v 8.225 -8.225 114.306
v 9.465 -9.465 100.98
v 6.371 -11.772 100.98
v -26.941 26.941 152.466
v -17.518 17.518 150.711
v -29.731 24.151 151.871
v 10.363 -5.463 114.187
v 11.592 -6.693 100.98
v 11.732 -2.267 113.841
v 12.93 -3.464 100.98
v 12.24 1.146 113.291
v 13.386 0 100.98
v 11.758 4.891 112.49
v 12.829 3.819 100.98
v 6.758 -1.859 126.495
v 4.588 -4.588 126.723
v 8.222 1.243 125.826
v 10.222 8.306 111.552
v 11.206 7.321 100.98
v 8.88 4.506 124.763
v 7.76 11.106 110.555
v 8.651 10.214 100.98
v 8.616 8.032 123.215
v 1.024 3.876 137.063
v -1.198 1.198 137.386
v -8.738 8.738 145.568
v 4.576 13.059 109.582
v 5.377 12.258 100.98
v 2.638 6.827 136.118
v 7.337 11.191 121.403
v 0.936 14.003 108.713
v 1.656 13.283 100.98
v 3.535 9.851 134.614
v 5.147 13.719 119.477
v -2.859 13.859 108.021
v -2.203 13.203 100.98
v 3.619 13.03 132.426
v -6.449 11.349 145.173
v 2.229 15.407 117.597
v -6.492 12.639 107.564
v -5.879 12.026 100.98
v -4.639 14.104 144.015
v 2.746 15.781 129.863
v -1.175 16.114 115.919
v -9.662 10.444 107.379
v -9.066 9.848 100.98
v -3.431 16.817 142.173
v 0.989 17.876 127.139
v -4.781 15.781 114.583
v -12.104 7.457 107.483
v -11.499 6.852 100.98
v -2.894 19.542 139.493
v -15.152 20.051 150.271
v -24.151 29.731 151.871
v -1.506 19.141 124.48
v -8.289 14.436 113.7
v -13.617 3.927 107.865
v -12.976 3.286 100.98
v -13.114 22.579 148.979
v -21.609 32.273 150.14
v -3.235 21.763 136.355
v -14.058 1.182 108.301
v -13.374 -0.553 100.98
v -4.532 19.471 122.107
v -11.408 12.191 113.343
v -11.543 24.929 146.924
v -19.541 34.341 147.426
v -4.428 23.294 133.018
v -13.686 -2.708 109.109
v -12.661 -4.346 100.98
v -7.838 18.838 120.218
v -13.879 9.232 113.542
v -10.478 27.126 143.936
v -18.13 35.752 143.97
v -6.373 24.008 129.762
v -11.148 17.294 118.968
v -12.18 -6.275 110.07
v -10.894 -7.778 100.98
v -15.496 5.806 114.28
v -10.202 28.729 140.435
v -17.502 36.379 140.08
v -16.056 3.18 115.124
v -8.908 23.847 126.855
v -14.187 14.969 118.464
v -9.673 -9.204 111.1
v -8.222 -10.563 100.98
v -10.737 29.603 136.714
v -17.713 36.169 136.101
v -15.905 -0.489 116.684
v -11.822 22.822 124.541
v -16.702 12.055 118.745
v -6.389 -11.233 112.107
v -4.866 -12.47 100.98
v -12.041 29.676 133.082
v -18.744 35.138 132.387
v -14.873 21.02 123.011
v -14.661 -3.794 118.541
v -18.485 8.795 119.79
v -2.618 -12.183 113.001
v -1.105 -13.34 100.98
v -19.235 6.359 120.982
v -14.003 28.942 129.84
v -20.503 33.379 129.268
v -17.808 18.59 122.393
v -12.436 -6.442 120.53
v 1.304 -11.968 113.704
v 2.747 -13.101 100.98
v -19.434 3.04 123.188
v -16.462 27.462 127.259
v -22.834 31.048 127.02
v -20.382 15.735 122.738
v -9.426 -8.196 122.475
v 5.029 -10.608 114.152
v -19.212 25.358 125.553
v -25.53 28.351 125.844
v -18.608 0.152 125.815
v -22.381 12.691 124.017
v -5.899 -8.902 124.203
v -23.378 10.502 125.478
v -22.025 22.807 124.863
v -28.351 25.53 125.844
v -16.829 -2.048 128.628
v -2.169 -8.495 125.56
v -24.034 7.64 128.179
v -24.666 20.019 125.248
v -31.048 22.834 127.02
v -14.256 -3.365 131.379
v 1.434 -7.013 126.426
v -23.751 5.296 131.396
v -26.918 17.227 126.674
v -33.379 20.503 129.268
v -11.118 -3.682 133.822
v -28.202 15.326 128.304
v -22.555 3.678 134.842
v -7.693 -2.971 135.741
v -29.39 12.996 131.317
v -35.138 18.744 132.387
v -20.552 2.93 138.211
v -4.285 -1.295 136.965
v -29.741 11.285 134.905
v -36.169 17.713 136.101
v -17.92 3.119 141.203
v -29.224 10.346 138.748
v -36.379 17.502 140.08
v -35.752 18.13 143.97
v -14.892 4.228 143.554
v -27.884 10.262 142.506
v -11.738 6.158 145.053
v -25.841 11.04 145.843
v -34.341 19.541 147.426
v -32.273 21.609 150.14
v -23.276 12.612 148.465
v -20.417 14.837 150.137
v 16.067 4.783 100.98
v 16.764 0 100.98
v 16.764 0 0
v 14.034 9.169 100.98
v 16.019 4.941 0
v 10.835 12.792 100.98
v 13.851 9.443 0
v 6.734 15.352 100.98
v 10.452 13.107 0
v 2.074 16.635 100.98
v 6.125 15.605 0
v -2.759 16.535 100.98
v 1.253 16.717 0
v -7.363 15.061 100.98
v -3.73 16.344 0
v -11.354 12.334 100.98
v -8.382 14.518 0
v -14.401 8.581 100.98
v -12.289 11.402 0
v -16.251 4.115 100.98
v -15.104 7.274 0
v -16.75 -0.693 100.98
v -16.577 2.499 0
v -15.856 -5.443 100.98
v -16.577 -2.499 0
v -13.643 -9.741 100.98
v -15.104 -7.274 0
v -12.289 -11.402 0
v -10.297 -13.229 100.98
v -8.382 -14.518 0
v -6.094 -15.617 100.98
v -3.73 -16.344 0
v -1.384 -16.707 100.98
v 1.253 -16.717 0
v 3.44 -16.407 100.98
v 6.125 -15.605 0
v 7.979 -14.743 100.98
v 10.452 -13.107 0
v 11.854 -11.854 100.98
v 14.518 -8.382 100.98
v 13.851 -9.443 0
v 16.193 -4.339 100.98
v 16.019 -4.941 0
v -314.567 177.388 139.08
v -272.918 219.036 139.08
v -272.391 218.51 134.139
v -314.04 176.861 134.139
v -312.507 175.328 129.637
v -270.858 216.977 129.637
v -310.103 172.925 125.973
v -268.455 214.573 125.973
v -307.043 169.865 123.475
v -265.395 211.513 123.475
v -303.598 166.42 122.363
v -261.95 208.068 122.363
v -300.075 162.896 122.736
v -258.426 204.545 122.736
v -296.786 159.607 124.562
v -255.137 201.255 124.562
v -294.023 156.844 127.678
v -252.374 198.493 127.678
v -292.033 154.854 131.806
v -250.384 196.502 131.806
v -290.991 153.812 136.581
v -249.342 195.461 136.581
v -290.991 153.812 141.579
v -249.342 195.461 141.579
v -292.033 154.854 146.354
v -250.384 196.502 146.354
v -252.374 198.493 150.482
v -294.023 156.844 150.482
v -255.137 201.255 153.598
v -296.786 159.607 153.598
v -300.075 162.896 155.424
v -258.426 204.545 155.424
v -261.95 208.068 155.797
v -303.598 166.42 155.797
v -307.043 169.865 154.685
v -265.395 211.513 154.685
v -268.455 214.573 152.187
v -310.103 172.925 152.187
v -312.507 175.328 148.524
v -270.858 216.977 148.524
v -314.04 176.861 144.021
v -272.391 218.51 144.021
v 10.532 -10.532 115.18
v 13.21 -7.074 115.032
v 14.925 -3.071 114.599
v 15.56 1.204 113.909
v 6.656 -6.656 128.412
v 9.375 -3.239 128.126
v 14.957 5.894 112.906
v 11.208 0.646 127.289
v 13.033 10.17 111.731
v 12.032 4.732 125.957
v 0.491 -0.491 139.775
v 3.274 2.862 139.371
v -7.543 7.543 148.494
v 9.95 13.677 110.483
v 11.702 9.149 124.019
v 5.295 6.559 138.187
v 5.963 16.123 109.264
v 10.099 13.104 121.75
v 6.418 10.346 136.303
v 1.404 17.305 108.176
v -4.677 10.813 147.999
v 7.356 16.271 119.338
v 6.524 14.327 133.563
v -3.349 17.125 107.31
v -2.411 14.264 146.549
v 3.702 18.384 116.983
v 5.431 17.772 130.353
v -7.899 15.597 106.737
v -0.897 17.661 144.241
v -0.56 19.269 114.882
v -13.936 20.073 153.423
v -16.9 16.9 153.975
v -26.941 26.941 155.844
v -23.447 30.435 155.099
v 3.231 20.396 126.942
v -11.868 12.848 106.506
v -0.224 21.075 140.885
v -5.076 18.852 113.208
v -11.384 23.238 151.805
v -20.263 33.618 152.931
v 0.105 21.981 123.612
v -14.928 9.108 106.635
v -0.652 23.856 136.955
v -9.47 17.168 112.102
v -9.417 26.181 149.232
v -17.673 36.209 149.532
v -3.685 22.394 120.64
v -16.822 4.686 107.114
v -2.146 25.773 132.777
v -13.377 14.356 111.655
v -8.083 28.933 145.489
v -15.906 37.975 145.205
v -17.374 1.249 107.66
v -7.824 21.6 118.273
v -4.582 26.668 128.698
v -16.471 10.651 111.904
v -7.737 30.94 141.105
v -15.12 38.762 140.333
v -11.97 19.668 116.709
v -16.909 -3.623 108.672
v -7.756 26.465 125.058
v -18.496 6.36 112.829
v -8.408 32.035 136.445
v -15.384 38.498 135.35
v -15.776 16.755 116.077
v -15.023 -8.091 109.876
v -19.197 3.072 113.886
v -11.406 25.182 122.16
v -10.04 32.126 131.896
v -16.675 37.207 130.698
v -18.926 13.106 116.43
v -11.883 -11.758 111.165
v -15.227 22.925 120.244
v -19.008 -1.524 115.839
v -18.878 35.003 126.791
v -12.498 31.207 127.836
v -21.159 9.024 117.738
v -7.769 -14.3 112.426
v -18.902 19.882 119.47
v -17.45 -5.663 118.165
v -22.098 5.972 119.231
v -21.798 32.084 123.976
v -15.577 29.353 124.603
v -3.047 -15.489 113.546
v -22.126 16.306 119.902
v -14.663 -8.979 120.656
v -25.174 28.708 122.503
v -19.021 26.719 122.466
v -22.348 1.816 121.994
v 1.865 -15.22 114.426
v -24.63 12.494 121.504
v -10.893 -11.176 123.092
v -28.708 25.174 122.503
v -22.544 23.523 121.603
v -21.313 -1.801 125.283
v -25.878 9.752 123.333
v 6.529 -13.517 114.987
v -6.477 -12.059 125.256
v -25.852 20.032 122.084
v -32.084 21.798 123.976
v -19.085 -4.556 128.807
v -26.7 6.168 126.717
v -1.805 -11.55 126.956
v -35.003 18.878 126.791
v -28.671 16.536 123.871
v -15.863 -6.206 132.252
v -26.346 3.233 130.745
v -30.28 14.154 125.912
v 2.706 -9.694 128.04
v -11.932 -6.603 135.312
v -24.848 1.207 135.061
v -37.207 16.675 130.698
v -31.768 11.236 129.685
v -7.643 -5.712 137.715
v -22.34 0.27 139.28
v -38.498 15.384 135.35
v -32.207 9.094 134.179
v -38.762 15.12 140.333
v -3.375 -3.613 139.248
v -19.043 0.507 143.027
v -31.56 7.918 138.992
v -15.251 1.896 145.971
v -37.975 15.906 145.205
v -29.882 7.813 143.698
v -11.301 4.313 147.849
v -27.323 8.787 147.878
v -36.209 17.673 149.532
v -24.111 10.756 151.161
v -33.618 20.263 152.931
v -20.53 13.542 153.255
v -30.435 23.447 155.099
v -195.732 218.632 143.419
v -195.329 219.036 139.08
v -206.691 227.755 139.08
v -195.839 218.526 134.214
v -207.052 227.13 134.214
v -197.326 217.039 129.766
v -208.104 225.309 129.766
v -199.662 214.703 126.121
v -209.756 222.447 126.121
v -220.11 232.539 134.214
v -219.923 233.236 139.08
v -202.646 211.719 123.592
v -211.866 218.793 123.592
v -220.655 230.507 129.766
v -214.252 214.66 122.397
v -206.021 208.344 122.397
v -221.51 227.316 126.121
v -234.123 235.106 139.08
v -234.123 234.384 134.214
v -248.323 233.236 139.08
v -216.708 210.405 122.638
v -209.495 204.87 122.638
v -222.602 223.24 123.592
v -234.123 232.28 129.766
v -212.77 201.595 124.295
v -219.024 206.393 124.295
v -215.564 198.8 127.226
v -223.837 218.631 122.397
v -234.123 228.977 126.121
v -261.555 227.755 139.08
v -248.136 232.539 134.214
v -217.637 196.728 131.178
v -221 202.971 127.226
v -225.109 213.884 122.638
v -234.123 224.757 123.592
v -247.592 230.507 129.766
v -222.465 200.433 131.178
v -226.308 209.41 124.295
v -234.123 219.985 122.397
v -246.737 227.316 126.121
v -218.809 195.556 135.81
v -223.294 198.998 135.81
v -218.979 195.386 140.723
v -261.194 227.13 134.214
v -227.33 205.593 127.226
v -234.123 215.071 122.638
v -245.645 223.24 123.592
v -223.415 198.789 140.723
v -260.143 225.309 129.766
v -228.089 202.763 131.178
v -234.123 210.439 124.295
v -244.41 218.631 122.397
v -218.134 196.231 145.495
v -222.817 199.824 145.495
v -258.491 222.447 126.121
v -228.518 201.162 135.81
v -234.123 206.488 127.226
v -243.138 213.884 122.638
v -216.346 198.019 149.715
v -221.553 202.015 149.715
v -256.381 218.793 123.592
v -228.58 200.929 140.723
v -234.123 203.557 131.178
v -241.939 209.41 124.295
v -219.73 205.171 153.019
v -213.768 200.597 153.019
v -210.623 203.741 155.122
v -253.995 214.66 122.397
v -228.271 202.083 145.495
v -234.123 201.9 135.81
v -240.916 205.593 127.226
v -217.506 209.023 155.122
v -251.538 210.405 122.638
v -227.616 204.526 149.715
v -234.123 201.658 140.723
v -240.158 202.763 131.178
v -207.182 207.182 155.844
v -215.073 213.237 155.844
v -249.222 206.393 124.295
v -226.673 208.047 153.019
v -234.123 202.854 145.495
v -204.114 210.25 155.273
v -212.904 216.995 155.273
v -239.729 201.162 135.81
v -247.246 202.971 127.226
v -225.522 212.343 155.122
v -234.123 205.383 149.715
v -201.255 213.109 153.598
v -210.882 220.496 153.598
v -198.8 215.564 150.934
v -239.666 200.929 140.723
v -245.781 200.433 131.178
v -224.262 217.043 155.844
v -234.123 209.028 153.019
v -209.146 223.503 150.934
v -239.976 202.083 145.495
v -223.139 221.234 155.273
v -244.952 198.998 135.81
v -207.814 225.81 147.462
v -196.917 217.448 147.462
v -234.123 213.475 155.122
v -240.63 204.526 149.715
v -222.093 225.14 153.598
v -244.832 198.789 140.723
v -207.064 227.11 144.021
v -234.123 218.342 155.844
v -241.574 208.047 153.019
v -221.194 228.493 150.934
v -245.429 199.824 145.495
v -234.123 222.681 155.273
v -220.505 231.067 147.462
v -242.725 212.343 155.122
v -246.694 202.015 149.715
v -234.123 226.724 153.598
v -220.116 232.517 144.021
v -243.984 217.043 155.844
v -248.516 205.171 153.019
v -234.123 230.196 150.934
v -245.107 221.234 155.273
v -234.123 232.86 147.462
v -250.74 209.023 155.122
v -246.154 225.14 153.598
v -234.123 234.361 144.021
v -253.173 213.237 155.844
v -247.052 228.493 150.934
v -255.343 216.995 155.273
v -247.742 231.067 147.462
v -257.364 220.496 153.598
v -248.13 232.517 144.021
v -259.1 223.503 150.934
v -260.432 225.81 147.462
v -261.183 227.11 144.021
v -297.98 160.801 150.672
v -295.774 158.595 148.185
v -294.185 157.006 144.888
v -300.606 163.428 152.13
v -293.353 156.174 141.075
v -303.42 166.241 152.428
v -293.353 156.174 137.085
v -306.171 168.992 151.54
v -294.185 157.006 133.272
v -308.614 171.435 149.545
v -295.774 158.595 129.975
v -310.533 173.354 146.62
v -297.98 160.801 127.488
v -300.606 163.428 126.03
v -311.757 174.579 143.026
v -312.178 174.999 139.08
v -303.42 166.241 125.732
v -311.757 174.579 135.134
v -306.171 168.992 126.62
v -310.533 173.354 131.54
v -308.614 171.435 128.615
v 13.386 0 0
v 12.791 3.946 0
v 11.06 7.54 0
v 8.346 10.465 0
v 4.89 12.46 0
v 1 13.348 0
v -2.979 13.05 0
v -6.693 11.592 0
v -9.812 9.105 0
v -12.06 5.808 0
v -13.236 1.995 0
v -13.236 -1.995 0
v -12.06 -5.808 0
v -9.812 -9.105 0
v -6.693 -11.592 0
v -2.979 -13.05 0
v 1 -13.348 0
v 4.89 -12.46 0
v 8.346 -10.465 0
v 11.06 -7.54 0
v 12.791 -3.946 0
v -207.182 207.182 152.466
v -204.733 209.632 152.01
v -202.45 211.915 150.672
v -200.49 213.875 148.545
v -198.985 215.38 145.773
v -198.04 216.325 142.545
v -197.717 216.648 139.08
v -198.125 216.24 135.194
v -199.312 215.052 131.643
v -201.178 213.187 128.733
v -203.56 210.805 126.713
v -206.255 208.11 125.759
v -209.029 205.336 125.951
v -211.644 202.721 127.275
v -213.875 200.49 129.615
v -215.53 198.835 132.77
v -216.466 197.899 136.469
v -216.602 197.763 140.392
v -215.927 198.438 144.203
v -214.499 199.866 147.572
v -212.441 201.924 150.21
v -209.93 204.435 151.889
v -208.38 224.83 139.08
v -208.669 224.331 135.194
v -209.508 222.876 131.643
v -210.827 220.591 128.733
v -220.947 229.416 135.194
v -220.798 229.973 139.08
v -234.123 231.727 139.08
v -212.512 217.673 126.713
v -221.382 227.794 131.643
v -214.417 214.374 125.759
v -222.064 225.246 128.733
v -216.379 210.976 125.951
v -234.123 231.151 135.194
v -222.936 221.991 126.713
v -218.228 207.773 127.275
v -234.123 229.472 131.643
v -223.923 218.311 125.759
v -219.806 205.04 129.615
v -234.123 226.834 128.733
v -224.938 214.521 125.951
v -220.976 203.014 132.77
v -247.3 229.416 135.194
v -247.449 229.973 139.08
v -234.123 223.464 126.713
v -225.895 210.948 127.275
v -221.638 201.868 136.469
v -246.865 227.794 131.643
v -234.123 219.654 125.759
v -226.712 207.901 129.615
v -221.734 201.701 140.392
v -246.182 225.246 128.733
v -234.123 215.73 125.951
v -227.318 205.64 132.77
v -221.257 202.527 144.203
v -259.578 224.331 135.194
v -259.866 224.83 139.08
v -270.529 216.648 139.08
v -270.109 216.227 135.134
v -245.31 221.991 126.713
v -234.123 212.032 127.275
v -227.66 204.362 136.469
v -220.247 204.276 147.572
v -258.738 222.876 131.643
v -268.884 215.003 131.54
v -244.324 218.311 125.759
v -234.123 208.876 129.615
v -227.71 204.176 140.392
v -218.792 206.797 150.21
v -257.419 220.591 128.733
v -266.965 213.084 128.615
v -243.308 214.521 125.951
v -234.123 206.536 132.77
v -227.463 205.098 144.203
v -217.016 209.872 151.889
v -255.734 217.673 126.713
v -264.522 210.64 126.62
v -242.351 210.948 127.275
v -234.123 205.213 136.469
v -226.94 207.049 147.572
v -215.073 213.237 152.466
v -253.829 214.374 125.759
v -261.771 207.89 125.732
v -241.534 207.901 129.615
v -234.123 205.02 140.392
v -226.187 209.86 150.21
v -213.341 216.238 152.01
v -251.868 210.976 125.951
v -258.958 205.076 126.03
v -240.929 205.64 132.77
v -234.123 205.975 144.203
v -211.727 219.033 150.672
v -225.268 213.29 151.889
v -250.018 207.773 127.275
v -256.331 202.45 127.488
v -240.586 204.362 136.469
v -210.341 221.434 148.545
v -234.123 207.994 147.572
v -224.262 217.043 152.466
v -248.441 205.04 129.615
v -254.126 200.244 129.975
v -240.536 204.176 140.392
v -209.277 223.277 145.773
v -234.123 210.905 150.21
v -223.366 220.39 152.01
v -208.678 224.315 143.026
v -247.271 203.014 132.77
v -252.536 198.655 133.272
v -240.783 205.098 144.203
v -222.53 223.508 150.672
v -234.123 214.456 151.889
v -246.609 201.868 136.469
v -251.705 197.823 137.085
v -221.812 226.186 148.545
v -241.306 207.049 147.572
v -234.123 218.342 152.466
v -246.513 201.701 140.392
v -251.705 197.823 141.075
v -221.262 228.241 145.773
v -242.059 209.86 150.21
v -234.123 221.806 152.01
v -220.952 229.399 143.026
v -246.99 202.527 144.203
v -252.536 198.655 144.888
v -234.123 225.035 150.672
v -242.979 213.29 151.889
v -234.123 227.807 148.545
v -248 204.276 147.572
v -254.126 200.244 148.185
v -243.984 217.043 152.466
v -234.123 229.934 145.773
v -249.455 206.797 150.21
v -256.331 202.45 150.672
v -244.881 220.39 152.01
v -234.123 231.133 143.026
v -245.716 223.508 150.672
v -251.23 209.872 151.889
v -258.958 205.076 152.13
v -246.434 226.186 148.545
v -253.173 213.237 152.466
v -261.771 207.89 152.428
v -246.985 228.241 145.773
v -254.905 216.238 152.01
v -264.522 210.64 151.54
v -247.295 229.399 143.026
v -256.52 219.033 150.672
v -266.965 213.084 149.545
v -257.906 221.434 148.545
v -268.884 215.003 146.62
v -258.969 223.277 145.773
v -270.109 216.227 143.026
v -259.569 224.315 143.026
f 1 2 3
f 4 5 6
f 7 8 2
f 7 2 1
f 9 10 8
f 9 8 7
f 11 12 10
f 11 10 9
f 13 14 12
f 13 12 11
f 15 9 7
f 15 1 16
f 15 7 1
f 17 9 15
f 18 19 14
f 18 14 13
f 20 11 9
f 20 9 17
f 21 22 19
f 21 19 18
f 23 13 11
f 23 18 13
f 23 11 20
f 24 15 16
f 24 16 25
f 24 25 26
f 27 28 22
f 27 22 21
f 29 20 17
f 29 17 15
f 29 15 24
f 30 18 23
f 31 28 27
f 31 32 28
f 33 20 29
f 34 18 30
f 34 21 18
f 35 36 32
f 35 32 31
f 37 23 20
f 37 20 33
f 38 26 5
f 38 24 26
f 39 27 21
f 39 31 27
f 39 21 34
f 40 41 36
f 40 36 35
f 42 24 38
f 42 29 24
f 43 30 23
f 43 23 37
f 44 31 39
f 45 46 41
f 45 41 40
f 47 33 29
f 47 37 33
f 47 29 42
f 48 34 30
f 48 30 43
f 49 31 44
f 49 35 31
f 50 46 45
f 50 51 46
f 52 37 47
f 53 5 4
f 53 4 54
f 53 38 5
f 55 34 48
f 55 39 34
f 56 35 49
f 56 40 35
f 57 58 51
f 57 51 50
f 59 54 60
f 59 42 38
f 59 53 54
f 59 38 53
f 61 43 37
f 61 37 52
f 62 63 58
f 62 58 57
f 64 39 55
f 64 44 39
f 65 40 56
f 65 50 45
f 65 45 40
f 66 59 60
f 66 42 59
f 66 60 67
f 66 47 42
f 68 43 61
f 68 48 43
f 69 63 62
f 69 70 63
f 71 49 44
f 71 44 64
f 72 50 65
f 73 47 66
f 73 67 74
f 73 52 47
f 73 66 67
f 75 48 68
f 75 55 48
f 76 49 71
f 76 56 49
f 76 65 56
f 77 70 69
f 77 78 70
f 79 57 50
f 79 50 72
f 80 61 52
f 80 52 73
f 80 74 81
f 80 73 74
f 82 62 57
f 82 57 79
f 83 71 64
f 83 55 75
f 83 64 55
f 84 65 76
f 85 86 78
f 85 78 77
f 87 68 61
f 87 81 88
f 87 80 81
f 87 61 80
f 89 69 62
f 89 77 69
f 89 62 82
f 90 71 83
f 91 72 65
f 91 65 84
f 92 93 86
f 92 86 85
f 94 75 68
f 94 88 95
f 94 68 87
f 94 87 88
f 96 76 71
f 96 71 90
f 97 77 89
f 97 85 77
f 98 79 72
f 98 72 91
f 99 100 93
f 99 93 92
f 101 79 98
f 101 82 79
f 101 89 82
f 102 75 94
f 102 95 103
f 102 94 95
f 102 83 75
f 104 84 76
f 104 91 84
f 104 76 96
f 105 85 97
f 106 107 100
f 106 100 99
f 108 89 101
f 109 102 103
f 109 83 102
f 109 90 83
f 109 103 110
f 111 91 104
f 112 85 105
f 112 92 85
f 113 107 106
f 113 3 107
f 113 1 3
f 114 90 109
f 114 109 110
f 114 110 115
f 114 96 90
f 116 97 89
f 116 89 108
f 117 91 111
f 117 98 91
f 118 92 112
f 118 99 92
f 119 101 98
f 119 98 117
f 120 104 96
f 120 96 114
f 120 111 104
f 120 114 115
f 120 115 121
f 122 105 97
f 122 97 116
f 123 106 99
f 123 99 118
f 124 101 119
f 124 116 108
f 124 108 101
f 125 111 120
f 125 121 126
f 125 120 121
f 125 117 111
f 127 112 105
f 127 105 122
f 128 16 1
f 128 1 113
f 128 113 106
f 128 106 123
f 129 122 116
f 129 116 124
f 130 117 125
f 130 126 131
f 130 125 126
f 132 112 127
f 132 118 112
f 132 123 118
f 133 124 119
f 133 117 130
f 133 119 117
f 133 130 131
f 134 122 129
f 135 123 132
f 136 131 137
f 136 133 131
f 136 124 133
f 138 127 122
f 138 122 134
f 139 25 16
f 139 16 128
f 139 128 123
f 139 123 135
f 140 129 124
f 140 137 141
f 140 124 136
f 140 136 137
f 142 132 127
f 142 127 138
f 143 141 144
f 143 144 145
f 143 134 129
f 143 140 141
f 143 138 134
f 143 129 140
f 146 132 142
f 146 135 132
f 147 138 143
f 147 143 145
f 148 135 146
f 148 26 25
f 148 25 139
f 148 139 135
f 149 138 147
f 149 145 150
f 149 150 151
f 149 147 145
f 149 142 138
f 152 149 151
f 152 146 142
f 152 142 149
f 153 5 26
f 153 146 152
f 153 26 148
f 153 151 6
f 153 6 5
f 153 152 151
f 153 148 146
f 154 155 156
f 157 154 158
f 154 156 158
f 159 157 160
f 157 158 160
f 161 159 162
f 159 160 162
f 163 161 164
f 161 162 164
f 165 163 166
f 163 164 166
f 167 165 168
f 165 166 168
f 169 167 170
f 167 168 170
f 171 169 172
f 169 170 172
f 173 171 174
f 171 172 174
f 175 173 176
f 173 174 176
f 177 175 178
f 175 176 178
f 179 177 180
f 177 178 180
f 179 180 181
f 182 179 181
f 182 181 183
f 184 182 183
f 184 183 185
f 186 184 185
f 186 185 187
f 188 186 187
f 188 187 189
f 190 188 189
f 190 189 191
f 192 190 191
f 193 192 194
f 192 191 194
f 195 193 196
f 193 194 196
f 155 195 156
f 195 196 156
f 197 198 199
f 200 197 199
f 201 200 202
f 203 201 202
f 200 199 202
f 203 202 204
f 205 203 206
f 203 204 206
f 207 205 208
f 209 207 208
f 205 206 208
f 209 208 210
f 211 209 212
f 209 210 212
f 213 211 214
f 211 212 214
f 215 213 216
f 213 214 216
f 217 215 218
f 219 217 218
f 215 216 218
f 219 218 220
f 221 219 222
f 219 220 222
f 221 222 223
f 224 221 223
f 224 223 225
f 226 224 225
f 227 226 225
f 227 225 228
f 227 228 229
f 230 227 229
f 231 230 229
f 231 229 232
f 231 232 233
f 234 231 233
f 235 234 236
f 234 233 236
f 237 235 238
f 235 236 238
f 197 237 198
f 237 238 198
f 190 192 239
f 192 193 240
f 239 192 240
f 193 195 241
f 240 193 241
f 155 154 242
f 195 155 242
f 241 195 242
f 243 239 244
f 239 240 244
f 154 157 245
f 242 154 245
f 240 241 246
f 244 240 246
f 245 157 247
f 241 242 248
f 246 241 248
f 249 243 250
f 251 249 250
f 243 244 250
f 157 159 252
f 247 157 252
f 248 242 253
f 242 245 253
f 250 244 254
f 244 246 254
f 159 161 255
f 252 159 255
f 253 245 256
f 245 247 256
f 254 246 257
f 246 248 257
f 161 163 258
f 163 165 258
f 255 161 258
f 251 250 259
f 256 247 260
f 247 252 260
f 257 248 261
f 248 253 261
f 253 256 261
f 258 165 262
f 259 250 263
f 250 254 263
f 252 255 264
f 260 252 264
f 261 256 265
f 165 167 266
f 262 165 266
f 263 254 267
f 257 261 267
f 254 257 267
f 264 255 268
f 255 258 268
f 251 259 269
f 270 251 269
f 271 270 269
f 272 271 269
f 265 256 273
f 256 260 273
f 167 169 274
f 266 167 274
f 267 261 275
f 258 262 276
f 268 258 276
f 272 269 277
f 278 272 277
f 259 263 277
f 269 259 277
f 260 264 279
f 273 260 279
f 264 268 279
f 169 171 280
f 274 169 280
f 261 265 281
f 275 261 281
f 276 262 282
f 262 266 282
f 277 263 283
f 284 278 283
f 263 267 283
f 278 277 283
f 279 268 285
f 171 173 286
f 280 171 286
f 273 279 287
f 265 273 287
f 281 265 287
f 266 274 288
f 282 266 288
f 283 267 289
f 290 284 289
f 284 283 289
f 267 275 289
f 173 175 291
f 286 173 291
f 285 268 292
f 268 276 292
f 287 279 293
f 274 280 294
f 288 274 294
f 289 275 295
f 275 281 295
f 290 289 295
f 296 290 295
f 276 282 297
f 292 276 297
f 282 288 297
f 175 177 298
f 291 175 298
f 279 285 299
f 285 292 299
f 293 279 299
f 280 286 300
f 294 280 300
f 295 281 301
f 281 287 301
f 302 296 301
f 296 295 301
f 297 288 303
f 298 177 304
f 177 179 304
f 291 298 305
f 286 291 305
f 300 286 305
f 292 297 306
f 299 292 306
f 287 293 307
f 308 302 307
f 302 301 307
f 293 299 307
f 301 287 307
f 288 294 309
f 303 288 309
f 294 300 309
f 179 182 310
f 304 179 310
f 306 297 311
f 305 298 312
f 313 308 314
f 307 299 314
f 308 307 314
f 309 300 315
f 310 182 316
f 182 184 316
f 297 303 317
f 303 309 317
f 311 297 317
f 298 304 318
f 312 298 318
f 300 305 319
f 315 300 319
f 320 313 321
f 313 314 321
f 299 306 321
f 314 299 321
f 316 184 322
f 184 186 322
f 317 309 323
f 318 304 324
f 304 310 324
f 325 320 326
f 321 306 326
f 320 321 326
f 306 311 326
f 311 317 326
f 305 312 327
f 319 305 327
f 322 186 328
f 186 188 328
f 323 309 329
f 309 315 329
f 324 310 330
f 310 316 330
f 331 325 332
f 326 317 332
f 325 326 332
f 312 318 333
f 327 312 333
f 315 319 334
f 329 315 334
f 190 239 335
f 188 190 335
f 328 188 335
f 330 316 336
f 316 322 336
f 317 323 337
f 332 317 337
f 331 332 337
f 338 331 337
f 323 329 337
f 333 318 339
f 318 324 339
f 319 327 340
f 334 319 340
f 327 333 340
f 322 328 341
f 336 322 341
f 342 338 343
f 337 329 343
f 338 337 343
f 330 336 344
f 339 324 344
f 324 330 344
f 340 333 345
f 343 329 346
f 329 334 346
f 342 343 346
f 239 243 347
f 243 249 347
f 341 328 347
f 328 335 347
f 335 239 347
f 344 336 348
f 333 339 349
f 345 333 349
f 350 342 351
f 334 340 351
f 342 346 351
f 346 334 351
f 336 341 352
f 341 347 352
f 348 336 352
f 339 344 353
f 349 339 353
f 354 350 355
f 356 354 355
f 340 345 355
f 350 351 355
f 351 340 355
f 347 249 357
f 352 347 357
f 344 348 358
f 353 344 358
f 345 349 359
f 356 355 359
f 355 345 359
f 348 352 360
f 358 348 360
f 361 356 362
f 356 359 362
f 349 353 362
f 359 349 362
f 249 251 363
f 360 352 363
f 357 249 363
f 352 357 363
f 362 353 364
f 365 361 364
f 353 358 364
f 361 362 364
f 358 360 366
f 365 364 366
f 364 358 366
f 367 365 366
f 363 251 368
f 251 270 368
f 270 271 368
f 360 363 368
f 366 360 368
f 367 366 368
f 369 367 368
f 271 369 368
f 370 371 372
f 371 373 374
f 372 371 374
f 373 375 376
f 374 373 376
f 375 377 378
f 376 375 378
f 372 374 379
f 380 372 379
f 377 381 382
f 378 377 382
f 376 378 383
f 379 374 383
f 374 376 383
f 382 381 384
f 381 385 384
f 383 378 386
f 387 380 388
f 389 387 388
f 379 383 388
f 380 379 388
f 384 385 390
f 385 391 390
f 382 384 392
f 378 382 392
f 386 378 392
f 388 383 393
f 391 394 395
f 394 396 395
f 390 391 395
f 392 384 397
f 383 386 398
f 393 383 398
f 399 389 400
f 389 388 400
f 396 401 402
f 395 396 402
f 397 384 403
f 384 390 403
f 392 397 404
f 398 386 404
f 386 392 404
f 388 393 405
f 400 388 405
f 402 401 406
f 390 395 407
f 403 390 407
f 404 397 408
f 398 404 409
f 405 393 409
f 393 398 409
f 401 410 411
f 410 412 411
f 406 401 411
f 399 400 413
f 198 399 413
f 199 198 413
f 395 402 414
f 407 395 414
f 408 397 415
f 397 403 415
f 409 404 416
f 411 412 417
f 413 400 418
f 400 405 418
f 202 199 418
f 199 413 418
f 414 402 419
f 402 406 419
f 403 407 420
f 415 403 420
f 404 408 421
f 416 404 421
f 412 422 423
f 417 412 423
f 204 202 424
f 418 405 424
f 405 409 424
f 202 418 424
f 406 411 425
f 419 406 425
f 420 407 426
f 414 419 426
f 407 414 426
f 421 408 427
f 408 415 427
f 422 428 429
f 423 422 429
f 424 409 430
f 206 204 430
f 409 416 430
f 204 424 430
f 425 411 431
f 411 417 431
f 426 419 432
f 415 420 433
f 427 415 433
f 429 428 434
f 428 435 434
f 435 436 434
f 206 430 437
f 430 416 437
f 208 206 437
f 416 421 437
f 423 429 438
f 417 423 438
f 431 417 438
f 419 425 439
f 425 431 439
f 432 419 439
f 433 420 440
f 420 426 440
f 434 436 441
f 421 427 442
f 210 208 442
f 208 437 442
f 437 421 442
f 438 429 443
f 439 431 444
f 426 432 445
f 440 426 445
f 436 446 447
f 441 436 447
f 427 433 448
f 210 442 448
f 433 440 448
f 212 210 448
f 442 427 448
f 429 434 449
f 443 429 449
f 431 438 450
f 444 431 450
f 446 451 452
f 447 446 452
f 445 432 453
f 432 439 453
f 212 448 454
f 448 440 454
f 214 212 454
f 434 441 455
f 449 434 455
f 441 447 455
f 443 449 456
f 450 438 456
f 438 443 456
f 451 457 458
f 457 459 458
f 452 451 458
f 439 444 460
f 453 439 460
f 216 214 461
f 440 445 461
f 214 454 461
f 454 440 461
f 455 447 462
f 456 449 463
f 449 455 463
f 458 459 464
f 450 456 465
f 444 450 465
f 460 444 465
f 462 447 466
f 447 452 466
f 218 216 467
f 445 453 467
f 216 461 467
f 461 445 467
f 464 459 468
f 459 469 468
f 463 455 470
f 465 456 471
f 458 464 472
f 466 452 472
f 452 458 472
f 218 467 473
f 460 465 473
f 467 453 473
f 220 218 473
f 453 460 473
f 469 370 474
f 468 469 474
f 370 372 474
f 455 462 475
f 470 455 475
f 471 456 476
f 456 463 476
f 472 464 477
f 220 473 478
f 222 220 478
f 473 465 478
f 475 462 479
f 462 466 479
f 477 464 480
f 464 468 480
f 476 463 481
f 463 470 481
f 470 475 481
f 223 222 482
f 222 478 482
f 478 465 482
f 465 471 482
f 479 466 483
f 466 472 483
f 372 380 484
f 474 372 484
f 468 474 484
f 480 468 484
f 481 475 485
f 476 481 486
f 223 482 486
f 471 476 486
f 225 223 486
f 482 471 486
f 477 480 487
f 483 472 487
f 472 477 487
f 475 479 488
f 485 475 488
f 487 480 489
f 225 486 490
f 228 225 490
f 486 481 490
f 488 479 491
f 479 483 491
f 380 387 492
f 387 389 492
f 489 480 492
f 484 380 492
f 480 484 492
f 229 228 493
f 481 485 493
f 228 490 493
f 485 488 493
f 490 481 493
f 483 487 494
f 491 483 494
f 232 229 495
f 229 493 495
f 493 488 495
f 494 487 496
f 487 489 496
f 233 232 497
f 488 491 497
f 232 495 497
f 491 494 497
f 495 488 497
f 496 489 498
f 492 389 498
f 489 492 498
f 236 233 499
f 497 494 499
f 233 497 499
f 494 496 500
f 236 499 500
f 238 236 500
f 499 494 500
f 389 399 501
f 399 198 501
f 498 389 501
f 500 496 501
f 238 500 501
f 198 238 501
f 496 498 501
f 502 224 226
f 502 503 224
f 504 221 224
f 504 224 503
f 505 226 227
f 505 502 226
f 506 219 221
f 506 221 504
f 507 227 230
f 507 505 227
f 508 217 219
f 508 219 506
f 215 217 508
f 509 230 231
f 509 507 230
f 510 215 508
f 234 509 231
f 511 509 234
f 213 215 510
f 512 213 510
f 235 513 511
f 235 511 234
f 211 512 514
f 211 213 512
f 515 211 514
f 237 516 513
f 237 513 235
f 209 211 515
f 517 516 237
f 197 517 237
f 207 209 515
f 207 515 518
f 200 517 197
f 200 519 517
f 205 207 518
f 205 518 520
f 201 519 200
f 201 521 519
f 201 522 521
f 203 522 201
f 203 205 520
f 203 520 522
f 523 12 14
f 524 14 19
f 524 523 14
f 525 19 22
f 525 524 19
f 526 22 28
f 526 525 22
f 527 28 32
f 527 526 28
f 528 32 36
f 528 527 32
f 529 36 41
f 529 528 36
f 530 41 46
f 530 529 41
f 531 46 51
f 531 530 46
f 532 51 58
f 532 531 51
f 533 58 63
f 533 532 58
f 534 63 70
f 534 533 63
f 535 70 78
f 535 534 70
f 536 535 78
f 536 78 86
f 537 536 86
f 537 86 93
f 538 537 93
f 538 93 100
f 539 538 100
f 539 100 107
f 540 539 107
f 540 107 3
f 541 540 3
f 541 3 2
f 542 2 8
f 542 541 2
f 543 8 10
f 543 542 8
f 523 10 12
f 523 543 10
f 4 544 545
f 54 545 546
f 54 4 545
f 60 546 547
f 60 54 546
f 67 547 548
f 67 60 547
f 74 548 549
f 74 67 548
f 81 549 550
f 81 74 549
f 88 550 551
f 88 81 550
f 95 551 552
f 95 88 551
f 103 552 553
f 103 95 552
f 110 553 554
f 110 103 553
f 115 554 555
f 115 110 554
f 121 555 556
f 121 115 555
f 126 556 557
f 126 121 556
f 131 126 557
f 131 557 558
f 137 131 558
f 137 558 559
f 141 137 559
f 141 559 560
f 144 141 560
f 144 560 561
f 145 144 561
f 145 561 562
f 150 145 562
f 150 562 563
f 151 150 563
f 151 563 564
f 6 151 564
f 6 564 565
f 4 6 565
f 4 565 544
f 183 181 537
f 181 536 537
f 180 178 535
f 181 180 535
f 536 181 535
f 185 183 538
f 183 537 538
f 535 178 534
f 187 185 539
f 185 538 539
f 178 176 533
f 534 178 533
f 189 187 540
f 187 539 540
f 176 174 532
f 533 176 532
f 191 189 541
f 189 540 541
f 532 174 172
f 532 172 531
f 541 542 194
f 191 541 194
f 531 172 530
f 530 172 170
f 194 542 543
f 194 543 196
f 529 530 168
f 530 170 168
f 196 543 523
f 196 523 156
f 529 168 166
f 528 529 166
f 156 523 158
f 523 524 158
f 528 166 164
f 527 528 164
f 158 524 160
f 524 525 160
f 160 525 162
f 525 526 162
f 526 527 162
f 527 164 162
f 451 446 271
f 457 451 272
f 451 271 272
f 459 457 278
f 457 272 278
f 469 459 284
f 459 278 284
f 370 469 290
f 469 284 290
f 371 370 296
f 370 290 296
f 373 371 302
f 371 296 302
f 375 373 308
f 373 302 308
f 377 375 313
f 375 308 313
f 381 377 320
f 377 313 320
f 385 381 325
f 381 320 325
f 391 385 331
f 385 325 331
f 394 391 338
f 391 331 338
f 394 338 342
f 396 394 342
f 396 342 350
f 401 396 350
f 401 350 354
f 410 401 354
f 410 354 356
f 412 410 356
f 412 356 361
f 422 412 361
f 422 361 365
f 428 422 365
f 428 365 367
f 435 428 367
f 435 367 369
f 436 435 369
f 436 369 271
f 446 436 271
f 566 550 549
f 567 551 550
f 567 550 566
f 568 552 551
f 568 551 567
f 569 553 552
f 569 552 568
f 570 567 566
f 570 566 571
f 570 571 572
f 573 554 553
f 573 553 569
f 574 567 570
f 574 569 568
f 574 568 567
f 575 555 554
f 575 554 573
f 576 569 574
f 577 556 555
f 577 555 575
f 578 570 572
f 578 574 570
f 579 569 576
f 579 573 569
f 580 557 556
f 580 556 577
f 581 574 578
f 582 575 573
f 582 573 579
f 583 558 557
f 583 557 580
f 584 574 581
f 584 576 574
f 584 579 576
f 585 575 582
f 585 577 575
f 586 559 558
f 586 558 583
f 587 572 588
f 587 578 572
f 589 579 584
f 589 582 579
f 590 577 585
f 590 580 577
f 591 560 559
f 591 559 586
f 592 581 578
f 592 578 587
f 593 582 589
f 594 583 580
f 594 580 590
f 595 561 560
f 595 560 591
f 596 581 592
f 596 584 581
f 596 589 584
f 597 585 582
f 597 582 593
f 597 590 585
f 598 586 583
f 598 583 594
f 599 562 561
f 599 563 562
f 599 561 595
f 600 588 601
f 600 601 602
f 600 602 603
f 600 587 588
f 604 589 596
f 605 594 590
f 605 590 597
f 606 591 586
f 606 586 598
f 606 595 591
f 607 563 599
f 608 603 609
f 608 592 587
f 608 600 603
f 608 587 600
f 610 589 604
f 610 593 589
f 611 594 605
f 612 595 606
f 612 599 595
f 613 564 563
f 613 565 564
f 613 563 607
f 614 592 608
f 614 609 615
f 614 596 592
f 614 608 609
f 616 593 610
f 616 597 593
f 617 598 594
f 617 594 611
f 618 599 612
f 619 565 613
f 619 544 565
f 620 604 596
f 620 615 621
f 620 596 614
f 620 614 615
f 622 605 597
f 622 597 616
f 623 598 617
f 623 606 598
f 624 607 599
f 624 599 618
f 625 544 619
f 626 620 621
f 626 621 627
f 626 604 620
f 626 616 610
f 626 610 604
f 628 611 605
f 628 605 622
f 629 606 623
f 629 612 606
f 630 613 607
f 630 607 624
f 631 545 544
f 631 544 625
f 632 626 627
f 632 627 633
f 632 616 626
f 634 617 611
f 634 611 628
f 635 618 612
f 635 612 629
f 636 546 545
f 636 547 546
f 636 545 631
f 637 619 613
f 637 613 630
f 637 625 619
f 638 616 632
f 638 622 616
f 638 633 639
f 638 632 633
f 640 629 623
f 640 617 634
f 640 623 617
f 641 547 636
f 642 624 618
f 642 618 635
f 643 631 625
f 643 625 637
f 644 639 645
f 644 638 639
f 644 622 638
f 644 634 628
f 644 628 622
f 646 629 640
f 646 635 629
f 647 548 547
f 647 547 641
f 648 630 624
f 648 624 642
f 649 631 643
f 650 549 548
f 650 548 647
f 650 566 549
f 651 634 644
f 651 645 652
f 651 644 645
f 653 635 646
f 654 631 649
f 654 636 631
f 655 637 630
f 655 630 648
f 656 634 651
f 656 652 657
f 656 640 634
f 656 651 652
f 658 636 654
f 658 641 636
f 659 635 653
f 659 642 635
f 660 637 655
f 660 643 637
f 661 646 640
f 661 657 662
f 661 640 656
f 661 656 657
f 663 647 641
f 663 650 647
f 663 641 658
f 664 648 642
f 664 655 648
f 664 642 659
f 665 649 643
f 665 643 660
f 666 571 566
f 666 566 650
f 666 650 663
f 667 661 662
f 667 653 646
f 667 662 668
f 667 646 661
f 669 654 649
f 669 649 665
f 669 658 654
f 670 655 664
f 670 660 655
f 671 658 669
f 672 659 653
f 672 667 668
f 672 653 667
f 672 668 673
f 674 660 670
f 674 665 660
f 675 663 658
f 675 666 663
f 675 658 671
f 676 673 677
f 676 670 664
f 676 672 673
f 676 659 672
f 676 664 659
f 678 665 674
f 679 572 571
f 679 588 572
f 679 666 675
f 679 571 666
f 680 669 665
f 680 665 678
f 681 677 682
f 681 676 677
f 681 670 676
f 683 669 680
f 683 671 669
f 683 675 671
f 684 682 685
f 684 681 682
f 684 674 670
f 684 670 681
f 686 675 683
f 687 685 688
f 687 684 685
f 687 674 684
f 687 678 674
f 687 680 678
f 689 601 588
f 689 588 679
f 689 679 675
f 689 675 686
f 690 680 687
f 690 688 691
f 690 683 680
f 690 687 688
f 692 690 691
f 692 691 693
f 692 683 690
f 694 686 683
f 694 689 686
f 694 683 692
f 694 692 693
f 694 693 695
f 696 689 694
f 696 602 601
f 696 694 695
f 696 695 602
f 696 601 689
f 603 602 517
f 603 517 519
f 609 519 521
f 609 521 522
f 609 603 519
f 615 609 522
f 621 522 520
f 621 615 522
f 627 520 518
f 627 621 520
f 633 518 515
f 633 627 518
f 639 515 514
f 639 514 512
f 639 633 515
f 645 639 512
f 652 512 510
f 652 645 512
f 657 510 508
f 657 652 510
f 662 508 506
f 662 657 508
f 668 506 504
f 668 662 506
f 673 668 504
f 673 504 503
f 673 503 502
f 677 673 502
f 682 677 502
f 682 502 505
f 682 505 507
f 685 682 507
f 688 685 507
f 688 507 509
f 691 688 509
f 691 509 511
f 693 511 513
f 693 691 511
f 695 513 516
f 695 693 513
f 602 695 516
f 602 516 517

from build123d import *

# Parameters (mm, degrees)
PIPESKETCH_R    = 16.764
PIPESKETCH_R_2  = 13.3858
EXTRUSION_DEPTH = 95
SKETCH_3_R      = 16.764
SKETCH_3_R_2    = 13.3858
EXTRUDE_2_DEPTH = 5.980008255
SKETCH_4_R      = 16.764
SKETCH_4_R_2    = 13.3858
REVOLVE_2_ANGLE = 90
SKETCH_5_R      = 16.764
SKETCH_5_R_2    = 13.3858
EXTRUDE_3_DEPTH = 254.900237781
SKETCH_6_R      = 16.764
SKETCH_6_R_2    = 13.3858
REVOLVE_3_ANGLE = 90
SKETCH_7_R      = 16.764
SKETCH_7_R_2    = 13.3858
EXTRUDE_4_DEPTH = 58.9


with BuildPart() as part:
    # PipeSketch → Extrusion (new body)
    with BuildSketch(Plane.XY):
        Circle(PIPESKETCH_R)
        Circle(PIPESKETCH_R_2, mode=Mode.SUBTRACT)
    extrude(amount=EXTRUSION_DEPTH)

    # 草图3 → 凸台-拉伸2 (add)
    with BuildSketch(Plane.XY.offset(95)):
        Circle(SKETCH_3_R)
        Circle(SKETCH_3_R_2, mode=Mode.SUBTRACT)
    extrude(amount=EXTRUDE_2_DEPTH)

    # 草图4 → 旋转2 (revolve)
    with BuildSketch(Plane.XY.offset(100.980008255)):
        with Locations(Location((0, 0, 0), (0, 0, 315))):
            Circle(SKETCH_4_R)
        with Locations(Location((0, 0, 0), (0, 0, 315))):
            Circle(SKETCH_4_R_2, mode=Mode.SUBTRACT)
    revolve(axis=Axis((-26.940768363, 26.940768363, 100.980008255), (-0.7071067811865476, -0.7071067811865476, 0)), revolution_arc=REVOLVE_2_ANGLE)

    # 草图5 → 凸台-拉伸3 (add)
    with BuildSketch(Plane(origin=(-26.940768363, 26.940768363, 0), x_dir=(0.7071067811865475, 0.7071067811865477, 0), z_dir=(-0.7071067811865477, 0.7071067811865475, 0))):
        with Locations(Location((0, -139.080008255, 0), (0, 0, 270))):
            Circle(SKETCH_5_R)
        with Locations(Location((0, -139.080008255, 0), (0, 0, 270))):
            Circle(SKETCH_5_R_2, mode=Mode.SUBTRACT)
    extrude(amount=EXTRUDE_3_DEPTH)

    # 草图6 → 旋转3 (revolve)
    with BuildSketch(Plane(origin=(-207.182455024, 207.182455024, 0), x_dir=(0, 0, 1), z_dir=(-0.7071067811865476, 0.7071067811865476, 0))):
        with Locations(Location((139.080008255, 0, 0), (0, 0, 90))):
            Circle(SKETCH_6_R)
        with Locations(Location((139.080008255, 0, 0), (0, 0, 90))):
            Circle(SKETCH_6_R_2, mode=Mode.SUBTRACT)
    revolve(axis=Axis((-234.123223388, 180.241686661, 139.080008255), (0, 0, 1)), revolution_arc=REVOLVE_3_ANGLE)

    # 草图7 → 凸台-拉伸4 (add)
    with BuildSketch(Plane(origin=(-26.940768363, -26.940768363, 0), x_dir=(-0.7071067811865479, 0.7071067811865472, 0), z_dir=(-0.7071067811865472, -0.7071067811865479, 0))):
        with Locations((331.100237781, -139.080008255)):
            Circle(SKETCH_7_R)
        with Locations((331.100237781, -139.080008255)):
            Circle(SKETCH_7_R_2, mode=Mode.SUBTRACT)
    extrude(amount=EXTRUDE_4_DEPTH)


solid = part.part
